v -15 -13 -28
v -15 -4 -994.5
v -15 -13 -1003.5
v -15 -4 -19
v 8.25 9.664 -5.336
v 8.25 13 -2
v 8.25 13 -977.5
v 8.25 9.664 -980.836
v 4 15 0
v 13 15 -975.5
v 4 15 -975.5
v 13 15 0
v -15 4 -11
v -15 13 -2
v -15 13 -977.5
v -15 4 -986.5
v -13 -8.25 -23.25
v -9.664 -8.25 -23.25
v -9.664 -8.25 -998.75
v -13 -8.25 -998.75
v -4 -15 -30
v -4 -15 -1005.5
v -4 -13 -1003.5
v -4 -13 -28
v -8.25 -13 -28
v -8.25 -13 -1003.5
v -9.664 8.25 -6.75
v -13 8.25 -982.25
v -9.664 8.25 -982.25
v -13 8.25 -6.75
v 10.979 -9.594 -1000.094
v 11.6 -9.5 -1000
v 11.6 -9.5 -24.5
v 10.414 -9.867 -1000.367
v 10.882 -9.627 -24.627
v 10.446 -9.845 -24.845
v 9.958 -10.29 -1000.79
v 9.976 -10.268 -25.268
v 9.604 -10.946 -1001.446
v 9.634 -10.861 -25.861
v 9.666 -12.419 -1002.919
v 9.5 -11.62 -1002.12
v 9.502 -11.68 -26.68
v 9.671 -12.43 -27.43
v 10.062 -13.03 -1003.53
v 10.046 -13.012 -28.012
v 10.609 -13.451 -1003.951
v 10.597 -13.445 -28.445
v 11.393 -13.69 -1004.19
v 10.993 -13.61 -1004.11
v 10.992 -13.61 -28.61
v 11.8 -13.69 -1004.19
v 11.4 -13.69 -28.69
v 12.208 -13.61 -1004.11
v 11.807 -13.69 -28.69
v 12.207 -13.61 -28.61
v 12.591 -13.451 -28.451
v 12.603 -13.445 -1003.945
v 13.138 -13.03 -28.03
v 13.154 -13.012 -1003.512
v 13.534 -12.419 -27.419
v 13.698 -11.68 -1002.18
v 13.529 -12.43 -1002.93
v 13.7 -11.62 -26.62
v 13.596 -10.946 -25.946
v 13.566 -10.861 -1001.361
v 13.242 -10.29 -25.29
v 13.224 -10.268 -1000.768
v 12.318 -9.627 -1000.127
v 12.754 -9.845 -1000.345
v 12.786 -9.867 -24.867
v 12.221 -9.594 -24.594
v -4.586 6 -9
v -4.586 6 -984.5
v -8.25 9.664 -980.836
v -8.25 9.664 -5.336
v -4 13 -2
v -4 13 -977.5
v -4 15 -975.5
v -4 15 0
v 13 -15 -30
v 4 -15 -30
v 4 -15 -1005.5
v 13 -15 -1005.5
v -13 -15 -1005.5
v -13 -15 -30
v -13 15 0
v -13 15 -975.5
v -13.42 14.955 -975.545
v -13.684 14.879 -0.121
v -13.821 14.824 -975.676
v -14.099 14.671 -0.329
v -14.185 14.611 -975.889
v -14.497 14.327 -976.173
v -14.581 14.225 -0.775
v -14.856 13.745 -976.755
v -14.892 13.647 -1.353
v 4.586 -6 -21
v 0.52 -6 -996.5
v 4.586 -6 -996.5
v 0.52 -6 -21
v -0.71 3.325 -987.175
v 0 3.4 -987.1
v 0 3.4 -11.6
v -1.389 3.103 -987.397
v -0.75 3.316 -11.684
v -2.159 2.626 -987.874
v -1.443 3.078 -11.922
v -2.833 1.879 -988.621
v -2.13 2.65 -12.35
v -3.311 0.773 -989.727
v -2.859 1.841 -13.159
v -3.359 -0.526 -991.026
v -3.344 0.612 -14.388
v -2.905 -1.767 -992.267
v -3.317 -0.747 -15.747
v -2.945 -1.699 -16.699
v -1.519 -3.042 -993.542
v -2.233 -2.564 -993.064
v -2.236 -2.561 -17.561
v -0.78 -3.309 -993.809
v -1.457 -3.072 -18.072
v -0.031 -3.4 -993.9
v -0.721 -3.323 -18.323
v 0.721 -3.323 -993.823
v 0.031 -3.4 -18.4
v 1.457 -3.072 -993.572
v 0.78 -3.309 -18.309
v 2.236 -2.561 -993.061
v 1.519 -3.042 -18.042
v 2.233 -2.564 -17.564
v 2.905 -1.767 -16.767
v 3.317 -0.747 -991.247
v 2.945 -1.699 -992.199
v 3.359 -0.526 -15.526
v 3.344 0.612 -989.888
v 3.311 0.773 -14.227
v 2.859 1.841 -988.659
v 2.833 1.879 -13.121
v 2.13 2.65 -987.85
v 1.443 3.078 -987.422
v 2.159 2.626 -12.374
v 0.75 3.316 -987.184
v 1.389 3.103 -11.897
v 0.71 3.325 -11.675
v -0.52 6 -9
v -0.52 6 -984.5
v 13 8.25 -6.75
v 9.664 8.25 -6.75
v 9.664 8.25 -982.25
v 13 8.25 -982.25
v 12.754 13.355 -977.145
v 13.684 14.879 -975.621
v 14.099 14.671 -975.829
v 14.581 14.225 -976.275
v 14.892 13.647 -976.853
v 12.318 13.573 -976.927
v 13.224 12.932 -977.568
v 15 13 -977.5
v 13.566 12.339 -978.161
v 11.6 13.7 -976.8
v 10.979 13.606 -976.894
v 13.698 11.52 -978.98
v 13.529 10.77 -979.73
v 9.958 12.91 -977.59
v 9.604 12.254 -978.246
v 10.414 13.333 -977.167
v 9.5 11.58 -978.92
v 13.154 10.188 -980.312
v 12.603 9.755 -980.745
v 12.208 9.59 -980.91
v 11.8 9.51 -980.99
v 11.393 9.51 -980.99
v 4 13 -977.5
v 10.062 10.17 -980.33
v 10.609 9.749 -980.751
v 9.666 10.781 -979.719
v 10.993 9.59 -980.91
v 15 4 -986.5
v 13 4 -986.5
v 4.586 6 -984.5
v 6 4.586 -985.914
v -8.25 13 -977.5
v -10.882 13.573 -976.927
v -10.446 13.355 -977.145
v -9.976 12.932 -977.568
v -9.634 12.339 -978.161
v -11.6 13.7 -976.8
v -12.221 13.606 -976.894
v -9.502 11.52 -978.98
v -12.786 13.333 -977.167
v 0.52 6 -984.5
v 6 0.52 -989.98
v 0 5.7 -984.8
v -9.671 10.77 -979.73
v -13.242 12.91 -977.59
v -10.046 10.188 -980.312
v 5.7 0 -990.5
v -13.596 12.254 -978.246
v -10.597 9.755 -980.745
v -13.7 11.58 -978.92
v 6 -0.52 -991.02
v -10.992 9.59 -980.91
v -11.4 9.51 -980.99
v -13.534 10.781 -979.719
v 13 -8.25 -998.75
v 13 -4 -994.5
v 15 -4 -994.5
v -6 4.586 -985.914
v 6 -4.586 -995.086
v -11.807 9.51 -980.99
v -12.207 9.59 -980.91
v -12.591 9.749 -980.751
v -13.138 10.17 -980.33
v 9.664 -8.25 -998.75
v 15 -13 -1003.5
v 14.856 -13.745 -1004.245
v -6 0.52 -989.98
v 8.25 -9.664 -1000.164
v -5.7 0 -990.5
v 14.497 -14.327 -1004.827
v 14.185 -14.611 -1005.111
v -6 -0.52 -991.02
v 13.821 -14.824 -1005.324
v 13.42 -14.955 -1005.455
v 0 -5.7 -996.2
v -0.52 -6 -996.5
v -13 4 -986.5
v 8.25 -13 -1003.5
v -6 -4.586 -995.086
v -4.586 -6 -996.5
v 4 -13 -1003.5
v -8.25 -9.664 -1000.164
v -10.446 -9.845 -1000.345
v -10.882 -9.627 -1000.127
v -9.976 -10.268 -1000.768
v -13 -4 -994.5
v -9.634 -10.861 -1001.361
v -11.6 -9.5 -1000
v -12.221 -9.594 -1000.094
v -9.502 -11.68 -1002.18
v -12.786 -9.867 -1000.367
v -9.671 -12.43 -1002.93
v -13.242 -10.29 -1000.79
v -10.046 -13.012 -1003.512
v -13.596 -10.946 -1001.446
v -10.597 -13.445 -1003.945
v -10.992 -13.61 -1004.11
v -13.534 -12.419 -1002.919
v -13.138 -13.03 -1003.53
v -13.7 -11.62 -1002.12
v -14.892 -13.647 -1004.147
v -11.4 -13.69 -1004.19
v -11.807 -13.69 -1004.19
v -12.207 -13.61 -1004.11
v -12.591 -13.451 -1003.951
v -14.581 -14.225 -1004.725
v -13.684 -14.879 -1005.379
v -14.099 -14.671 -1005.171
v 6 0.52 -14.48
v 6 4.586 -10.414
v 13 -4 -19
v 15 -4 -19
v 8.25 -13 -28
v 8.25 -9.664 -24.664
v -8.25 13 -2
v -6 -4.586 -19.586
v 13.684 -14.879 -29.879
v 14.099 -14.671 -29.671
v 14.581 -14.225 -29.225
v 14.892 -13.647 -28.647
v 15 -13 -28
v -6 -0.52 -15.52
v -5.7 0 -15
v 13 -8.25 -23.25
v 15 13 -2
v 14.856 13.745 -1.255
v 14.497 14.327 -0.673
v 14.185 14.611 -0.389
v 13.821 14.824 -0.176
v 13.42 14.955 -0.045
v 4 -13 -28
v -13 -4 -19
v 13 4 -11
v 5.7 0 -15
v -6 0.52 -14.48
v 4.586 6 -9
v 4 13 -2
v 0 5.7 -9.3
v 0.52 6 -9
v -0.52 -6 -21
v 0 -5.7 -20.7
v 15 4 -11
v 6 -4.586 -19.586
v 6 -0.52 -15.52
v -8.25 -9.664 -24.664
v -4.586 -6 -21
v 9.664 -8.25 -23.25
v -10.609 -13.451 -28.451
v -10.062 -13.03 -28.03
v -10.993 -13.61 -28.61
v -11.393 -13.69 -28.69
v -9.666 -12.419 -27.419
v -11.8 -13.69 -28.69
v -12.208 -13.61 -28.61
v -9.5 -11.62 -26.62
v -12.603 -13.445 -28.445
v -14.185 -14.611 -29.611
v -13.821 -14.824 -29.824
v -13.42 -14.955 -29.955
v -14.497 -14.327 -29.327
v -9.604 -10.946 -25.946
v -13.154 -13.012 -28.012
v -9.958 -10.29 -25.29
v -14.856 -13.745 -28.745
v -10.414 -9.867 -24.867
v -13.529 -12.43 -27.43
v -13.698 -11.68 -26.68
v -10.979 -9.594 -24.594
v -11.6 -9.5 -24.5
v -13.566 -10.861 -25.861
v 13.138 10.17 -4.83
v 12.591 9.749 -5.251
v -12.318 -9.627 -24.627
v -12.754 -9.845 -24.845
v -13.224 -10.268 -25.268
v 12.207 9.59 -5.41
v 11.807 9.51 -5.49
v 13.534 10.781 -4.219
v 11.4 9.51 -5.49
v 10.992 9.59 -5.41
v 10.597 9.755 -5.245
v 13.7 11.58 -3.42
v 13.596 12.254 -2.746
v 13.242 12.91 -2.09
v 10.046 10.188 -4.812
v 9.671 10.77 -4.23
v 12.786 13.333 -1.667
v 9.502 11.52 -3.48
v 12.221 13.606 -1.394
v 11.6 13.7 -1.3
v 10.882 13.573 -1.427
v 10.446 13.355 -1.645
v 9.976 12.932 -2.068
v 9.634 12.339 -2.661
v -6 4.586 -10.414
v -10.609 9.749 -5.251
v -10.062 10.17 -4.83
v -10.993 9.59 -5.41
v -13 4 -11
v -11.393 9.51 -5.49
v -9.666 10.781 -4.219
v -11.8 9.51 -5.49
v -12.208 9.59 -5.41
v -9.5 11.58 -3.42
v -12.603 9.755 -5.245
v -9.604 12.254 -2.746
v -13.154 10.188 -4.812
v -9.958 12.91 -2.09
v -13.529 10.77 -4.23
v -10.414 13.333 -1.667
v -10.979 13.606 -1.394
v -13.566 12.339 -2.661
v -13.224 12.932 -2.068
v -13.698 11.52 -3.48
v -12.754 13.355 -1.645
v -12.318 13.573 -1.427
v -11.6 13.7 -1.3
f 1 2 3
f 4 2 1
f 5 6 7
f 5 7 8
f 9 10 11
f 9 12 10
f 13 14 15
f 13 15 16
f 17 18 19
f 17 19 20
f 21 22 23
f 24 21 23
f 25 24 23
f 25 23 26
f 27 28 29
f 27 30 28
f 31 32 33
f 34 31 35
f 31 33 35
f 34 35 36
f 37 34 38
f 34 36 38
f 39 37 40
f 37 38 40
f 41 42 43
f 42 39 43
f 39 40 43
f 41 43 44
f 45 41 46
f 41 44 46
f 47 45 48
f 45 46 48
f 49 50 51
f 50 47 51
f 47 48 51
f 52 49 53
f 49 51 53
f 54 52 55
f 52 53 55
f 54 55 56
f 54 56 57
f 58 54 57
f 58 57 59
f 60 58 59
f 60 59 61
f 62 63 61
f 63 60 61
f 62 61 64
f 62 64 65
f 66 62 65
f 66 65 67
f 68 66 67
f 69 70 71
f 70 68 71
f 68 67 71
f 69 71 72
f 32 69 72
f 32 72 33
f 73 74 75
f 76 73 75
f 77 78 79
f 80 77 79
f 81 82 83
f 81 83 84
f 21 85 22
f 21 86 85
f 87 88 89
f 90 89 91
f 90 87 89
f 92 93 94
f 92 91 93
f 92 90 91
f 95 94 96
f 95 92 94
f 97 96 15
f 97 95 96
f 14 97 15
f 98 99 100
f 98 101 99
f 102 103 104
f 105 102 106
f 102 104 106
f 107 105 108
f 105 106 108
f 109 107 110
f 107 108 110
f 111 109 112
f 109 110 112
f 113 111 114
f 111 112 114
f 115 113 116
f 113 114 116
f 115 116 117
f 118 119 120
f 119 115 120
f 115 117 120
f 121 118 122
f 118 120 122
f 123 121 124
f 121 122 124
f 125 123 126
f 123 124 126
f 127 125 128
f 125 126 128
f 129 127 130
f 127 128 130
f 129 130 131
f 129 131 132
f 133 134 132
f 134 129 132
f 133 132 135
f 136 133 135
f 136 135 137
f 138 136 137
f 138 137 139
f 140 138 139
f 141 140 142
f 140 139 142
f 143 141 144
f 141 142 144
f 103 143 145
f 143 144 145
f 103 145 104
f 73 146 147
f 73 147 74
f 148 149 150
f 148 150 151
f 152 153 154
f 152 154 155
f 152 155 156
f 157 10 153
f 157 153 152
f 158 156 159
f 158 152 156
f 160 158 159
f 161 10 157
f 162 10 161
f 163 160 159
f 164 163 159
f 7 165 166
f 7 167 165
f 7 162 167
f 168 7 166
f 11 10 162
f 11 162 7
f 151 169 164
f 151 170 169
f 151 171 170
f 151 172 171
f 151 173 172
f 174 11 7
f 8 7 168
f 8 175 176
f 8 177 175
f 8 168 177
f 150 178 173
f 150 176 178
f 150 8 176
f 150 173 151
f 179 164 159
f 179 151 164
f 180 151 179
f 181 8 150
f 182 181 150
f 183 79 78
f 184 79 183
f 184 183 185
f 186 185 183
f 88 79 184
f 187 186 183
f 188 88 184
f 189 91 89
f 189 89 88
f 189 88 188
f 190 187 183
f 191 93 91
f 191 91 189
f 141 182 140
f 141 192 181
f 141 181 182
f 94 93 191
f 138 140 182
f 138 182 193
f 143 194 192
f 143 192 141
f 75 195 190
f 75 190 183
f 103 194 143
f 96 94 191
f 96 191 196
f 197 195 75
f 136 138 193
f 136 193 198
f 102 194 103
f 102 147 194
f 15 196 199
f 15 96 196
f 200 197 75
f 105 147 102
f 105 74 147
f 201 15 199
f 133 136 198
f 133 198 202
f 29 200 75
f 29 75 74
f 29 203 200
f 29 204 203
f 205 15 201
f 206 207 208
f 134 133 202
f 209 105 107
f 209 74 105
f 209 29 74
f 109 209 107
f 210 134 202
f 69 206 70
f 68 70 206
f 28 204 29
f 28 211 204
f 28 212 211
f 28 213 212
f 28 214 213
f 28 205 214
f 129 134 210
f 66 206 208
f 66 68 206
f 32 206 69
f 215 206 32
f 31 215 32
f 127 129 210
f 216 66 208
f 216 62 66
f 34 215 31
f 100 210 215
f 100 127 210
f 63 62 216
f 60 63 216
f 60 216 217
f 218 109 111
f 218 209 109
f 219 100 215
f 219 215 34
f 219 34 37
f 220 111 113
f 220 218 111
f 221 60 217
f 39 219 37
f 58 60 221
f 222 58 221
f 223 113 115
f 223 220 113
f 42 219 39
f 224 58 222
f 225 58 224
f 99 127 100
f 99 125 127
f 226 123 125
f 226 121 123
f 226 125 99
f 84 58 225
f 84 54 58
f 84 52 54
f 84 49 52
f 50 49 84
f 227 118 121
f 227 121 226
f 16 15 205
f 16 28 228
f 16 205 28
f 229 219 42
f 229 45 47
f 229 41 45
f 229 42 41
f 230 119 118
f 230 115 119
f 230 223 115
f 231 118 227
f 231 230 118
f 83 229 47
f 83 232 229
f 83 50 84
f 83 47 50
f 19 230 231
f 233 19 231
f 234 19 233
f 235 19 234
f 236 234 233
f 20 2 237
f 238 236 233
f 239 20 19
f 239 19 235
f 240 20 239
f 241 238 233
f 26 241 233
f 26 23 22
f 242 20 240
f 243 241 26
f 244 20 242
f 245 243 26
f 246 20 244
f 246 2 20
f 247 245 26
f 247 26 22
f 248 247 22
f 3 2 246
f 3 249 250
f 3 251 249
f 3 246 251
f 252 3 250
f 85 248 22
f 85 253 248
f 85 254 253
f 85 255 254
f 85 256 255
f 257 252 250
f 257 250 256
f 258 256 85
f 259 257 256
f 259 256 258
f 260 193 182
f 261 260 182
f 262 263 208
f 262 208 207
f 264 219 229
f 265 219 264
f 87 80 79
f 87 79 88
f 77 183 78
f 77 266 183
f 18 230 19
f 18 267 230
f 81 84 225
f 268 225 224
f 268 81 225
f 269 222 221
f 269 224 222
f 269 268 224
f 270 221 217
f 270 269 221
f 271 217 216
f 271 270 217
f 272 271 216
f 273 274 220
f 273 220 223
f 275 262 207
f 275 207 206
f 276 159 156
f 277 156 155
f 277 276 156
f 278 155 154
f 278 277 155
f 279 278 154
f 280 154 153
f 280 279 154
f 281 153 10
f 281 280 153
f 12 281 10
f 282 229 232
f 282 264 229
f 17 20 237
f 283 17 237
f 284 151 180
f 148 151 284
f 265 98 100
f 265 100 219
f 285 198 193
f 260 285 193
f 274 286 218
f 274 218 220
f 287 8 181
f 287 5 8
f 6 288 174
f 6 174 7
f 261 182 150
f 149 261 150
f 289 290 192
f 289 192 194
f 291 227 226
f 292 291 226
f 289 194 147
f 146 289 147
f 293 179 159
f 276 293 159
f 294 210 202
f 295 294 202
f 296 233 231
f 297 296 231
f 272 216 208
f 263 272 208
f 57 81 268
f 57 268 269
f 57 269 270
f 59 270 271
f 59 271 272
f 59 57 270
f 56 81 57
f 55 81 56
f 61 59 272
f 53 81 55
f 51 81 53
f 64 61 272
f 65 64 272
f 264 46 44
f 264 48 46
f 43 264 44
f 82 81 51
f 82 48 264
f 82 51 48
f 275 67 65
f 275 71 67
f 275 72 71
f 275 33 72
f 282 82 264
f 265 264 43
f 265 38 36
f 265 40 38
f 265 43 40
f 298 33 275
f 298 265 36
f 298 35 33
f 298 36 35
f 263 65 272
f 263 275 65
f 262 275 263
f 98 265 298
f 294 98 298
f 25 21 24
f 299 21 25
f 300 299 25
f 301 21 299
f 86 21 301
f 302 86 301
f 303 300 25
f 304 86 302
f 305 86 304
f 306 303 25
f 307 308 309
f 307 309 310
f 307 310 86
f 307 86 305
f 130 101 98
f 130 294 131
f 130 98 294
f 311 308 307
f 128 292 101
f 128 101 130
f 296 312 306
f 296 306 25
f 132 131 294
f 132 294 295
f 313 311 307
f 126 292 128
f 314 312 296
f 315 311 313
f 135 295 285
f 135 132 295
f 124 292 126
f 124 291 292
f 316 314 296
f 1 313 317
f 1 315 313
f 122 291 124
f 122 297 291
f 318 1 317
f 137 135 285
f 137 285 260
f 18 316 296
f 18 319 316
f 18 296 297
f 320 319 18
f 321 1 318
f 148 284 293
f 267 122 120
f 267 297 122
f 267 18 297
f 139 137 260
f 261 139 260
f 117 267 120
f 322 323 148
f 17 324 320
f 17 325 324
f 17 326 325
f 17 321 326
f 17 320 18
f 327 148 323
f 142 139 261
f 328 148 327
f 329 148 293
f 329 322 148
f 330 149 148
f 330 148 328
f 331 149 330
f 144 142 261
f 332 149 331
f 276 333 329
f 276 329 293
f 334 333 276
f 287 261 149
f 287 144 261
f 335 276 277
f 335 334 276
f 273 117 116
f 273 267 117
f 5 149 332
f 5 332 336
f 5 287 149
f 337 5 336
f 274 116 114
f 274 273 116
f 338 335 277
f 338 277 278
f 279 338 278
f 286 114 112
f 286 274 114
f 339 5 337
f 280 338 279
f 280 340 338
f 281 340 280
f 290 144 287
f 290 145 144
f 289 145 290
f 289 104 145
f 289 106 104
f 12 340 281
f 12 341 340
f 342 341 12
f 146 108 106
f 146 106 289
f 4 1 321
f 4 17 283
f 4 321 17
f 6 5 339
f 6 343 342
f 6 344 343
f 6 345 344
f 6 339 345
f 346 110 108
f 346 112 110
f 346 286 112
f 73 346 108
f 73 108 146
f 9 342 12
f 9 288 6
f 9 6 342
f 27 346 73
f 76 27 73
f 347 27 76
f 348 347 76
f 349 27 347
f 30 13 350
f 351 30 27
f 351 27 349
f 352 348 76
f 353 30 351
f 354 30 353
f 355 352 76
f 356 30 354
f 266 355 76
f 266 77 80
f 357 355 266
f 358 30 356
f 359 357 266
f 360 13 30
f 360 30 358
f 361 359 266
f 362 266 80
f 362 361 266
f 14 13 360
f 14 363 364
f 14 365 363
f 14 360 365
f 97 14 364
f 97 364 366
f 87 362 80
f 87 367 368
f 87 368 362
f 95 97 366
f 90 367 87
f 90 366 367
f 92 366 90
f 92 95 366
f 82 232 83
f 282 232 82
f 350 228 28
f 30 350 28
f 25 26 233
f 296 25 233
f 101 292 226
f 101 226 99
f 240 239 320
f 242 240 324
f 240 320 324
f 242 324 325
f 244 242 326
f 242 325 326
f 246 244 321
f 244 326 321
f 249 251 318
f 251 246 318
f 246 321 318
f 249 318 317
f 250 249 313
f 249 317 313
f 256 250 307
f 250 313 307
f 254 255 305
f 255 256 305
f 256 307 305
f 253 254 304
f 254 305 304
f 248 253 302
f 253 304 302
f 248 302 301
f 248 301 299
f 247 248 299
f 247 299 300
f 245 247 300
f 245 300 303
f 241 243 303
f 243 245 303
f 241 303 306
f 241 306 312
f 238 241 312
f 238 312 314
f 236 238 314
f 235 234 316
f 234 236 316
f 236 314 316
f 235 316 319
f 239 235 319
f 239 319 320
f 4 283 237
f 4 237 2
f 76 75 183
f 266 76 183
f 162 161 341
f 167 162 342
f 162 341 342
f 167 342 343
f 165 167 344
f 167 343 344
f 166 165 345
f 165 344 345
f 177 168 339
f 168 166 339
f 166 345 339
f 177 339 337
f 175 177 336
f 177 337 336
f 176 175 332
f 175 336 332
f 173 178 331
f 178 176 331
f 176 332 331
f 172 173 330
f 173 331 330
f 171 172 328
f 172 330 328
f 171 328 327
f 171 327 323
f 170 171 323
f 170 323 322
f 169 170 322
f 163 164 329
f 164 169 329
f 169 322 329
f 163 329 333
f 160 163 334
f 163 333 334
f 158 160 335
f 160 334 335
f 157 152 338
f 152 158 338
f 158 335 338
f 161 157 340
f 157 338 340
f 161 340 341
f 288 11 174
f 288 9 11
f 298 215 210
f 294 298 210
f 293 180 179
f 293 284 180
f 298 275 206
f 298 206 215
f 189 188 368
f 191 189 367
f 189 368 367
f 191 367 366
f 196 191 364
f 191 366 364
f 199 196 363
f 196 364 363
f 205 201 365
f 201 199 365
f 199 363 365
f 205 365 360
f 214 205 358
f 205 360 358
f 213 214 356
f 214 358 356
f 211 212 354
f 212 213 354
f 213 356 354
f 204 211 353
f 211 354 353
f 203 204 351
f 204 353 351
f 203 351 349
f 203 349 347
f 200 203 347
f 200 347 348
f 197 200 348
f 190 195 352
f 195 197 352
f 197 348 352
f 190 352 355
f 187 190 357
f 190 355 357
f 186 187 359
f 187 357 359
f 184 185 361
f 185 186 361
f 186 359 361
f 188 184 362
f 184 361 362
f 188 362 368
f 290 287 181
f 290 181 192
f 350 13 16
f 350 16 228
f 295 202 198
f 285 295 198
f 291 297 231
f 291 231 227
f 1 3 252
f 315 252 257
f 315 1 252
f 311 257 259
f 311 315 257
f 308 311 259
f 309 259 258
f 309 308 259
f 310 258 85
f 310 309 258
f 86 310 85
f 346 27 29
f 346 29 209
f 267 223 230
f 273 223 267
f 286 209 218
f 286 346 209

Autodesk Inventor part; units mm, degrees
sketch "Sketch_1" plane through (0, 0, 0) normal (0, 0, 1) x (1, 0, 0)
  line L0 (-15, -4) -> (-15, -13)
  arc A0 (-15, -13) -> (-13, -15) centre (-13, -13) ccw
  line L1 (-13, -15) -> (-4, -15)
  line L2 (-4, -15) -> (-4, -13)
  line L3 (-4, -13) -> (-8.25, -13)
  line L4 (-8.25, -13) -> (-8.25, -9.6642)
  line L5 (-8.25, -9.6642) -> (-4.5858, -6)
  line L6 (-4.5858, -6) -> (-0.5196, -6)
  line L7 (-0.5196, -6) -> (0, -5.7)
  line L8 (0, -5.7) -> (0.5196, -6)
  line L9 (0.5196, -6) -> (4.5858, -6)
  line L10 (4.5858, -6) -> (8.25, -9.6642)
  line L11 (8.25, -9.6642) -> (8.25, -13)
  line L12 (8.25, -13) -> (4, -13)
  line L13 (4, -13) -> (4, -15)
  line L14 (4, -15) -> (13, -15)
  arc A1 (13, -15) -> (15, -13) centre (13, -13) ccw
  line L15 (15, -13) -> (15, -4)
  line L16 (15, -4) -> (13, -4)
  line L17 (13, -4) -> (13, -8.25)
  line L18 (13, -8.25) -> (9.6642, -8.25)
  line L19 (9.6642, -8.25) -> (6, -4.5858)
  line L20 (6, -4.5858) -> (6, -0.5196)
  line L21 (6, -0.5196) -> (5.7, 0)
  line L22 (5.7, 0) -> (6, 0.5196)
  line L23 (6, 0.5196) -> (6, 4.5858)
  line L24 (6, 4.5858) -> (9.6642, 8.25)
  line L25 (9.6642, 8.25) -> (13, 8.25)
  line L26 (13, 8.25) -> (13, 4)
  line L27 (13, 4) -> (15, 4)
  line L28 (15, 4) -> (15, 13)
  arc A2 (15, 13) -> (13, 15) centre (13, 13) ccw
  line L29 (13, 15) -> (4, 15)
  line L30 (4, 15) -> (4, 13)
  line L31 (4, 13) -> (8.25, 13)
  line L32 (8.25, 13) -> (8.25, 9.6642)
  line L33 (8.25, 9.6642) -> (4.5858, 6)
  line L34 (4.5858, 6) -> (0.5196, 6)
  line L35 (0.5196, 6) -> (0, 5.7)
  line L36 (0, 5.7) -> (-0.5196, 6)
  line L37 (-0.5196, 6) -> (-4.5858, 6)
  line L38 (-4.5858, 6) -> (-8.25, 9.6642)
  line L39 (-8.25, 9.6642) -> (-8.25, 13)
  line L40 (-8.25, 13) -> (-4, 13)
  line L41 (-4, 13) -> (-4, 15)
  line L42 (-4, 15) -> (-13, 15)
  arc A3 (-13, 15) -> (-15, 13) centre (-13, 13) ccw
  line L43 (-15, 13) -> (-15, 4)
  line L44 (-15, 4) -> (-13, 4)
  line L45 (-13, 4) -> (-13, 8.25)
  line L46 (-13, 8.25) -> (-9.6642, 8.25)
  line L47 (-9.6642, 8.25) -> (-6, 4.5858)
  line L48 (-6, 4.5858) -> (-6, 0.5196)
  line L49 (-6, 0.5196) -> (-5.7, 0)
  line L50 (-5.7, 0) -> (-6, -0.5196)
  line L51 (-6, -0.5196) -> (-6, -4.5858)
  line L52 (-6, -4.5858) -> (-9.6642, -8.25)
  line L53 (-9.6642, -8.25) -> (-13, -8.25)
  line L54 (-13, -8.25) -> (-13, -4)
  line L55 (-13, -4) -> (-15, -4)
extrude "Extrusion1" add sketch "Sketch_1" against normal blind 1005.5
sketch "Sketch2" plane through (0, 0, -1005.5) normal (0, 0, -1) x (-1, 0, 0)
  point P0 (0, 0)
hole "Hole1" at (0, 0, -1005.5) direction (0, 0, 1) diameter 6.8 depth 1005.5
sketch "Sketch3" plane through (0, 0, -1005.5) normal (0, 0, -1) x (-1, 0, 0)
  point P0 (-11.6, 11.6)
hole "Hole2" at (11.6, 11.6, -1005.5) direction (0, 0, 1) diameter 4.2 depth 1005.5
pattern_linear "Rectangular Pattern1" count 2 spacing 23.2 along (-1, 0, 0) count 2 spacing 23.2 along (0, -1, 0) of "Hole2"
sketch "Sketch_5" plane through (0, 0, 0) normal (1, 0, 0) x (0, 0, -1)
  line L0 (0, 15) -> (0, -15)
  line L1 (0, -15) -> (30, -15)
  line L2 (30, -15) -> (0, 15)
extrude "Extrusion2" cut sketch "Sketch_5" along normal mid plane 30
sketch "Sketch_8" plane through (0, 0, 0) normal (1, 0, 0) x (0, 0, -1)
  line L0 (975.5, 15) -> (1005.5, -15)
  line L1 (1005.5, -15) -> (1005.5, 15)
  line L2 (1005.5, 15) -> (975.5, 15)
extrude "Extrusion3" cut sketch "Sketch_8" along normal mid plane 30
ref_plane "C1_XY" through (0, 0, 0) normal (0, 0, 1) x (1, 0, 0)
ref_plane "C1_YZ" through (0, 0, 0) normal (1, 0, 0) x (0, 1, 0)
ref_plane "C1_ZX" through (0, 0, 0) normal (0, 1, 0) x (0, 0, 1)
ref_plane "to_frame_cap1_XY" through (0, 0, 0) normal (0, 0, 1) x (1, 0, 0)
ref_plane "to_frame_cap1_YZ" through (0, 0, 0) normal (1, 0, 0) x (0, 1, 0)
ref_plane "to_frame_cap1_ZX" through (0, 0, 0) normal (0, 1, 0) x (0, 0, 1)
ref_plane "to_frame_cap2_XY" through (0, 0, -1005.5) normal (0, 0, -1) x (1, 0, 0)
ref_plane "to_frame_cap2_YZ" through (0, 0, -1005.5) normal (1, 0, 0) x (0, -1, 0)
ref_plane "to_frame_cap2_ZX" through (0, 0, -1005.5) normal (0, -1, 0) x (0, 0, -1)
properties part number "HFS6-3030-1005.5-LAT45-RCT45"
